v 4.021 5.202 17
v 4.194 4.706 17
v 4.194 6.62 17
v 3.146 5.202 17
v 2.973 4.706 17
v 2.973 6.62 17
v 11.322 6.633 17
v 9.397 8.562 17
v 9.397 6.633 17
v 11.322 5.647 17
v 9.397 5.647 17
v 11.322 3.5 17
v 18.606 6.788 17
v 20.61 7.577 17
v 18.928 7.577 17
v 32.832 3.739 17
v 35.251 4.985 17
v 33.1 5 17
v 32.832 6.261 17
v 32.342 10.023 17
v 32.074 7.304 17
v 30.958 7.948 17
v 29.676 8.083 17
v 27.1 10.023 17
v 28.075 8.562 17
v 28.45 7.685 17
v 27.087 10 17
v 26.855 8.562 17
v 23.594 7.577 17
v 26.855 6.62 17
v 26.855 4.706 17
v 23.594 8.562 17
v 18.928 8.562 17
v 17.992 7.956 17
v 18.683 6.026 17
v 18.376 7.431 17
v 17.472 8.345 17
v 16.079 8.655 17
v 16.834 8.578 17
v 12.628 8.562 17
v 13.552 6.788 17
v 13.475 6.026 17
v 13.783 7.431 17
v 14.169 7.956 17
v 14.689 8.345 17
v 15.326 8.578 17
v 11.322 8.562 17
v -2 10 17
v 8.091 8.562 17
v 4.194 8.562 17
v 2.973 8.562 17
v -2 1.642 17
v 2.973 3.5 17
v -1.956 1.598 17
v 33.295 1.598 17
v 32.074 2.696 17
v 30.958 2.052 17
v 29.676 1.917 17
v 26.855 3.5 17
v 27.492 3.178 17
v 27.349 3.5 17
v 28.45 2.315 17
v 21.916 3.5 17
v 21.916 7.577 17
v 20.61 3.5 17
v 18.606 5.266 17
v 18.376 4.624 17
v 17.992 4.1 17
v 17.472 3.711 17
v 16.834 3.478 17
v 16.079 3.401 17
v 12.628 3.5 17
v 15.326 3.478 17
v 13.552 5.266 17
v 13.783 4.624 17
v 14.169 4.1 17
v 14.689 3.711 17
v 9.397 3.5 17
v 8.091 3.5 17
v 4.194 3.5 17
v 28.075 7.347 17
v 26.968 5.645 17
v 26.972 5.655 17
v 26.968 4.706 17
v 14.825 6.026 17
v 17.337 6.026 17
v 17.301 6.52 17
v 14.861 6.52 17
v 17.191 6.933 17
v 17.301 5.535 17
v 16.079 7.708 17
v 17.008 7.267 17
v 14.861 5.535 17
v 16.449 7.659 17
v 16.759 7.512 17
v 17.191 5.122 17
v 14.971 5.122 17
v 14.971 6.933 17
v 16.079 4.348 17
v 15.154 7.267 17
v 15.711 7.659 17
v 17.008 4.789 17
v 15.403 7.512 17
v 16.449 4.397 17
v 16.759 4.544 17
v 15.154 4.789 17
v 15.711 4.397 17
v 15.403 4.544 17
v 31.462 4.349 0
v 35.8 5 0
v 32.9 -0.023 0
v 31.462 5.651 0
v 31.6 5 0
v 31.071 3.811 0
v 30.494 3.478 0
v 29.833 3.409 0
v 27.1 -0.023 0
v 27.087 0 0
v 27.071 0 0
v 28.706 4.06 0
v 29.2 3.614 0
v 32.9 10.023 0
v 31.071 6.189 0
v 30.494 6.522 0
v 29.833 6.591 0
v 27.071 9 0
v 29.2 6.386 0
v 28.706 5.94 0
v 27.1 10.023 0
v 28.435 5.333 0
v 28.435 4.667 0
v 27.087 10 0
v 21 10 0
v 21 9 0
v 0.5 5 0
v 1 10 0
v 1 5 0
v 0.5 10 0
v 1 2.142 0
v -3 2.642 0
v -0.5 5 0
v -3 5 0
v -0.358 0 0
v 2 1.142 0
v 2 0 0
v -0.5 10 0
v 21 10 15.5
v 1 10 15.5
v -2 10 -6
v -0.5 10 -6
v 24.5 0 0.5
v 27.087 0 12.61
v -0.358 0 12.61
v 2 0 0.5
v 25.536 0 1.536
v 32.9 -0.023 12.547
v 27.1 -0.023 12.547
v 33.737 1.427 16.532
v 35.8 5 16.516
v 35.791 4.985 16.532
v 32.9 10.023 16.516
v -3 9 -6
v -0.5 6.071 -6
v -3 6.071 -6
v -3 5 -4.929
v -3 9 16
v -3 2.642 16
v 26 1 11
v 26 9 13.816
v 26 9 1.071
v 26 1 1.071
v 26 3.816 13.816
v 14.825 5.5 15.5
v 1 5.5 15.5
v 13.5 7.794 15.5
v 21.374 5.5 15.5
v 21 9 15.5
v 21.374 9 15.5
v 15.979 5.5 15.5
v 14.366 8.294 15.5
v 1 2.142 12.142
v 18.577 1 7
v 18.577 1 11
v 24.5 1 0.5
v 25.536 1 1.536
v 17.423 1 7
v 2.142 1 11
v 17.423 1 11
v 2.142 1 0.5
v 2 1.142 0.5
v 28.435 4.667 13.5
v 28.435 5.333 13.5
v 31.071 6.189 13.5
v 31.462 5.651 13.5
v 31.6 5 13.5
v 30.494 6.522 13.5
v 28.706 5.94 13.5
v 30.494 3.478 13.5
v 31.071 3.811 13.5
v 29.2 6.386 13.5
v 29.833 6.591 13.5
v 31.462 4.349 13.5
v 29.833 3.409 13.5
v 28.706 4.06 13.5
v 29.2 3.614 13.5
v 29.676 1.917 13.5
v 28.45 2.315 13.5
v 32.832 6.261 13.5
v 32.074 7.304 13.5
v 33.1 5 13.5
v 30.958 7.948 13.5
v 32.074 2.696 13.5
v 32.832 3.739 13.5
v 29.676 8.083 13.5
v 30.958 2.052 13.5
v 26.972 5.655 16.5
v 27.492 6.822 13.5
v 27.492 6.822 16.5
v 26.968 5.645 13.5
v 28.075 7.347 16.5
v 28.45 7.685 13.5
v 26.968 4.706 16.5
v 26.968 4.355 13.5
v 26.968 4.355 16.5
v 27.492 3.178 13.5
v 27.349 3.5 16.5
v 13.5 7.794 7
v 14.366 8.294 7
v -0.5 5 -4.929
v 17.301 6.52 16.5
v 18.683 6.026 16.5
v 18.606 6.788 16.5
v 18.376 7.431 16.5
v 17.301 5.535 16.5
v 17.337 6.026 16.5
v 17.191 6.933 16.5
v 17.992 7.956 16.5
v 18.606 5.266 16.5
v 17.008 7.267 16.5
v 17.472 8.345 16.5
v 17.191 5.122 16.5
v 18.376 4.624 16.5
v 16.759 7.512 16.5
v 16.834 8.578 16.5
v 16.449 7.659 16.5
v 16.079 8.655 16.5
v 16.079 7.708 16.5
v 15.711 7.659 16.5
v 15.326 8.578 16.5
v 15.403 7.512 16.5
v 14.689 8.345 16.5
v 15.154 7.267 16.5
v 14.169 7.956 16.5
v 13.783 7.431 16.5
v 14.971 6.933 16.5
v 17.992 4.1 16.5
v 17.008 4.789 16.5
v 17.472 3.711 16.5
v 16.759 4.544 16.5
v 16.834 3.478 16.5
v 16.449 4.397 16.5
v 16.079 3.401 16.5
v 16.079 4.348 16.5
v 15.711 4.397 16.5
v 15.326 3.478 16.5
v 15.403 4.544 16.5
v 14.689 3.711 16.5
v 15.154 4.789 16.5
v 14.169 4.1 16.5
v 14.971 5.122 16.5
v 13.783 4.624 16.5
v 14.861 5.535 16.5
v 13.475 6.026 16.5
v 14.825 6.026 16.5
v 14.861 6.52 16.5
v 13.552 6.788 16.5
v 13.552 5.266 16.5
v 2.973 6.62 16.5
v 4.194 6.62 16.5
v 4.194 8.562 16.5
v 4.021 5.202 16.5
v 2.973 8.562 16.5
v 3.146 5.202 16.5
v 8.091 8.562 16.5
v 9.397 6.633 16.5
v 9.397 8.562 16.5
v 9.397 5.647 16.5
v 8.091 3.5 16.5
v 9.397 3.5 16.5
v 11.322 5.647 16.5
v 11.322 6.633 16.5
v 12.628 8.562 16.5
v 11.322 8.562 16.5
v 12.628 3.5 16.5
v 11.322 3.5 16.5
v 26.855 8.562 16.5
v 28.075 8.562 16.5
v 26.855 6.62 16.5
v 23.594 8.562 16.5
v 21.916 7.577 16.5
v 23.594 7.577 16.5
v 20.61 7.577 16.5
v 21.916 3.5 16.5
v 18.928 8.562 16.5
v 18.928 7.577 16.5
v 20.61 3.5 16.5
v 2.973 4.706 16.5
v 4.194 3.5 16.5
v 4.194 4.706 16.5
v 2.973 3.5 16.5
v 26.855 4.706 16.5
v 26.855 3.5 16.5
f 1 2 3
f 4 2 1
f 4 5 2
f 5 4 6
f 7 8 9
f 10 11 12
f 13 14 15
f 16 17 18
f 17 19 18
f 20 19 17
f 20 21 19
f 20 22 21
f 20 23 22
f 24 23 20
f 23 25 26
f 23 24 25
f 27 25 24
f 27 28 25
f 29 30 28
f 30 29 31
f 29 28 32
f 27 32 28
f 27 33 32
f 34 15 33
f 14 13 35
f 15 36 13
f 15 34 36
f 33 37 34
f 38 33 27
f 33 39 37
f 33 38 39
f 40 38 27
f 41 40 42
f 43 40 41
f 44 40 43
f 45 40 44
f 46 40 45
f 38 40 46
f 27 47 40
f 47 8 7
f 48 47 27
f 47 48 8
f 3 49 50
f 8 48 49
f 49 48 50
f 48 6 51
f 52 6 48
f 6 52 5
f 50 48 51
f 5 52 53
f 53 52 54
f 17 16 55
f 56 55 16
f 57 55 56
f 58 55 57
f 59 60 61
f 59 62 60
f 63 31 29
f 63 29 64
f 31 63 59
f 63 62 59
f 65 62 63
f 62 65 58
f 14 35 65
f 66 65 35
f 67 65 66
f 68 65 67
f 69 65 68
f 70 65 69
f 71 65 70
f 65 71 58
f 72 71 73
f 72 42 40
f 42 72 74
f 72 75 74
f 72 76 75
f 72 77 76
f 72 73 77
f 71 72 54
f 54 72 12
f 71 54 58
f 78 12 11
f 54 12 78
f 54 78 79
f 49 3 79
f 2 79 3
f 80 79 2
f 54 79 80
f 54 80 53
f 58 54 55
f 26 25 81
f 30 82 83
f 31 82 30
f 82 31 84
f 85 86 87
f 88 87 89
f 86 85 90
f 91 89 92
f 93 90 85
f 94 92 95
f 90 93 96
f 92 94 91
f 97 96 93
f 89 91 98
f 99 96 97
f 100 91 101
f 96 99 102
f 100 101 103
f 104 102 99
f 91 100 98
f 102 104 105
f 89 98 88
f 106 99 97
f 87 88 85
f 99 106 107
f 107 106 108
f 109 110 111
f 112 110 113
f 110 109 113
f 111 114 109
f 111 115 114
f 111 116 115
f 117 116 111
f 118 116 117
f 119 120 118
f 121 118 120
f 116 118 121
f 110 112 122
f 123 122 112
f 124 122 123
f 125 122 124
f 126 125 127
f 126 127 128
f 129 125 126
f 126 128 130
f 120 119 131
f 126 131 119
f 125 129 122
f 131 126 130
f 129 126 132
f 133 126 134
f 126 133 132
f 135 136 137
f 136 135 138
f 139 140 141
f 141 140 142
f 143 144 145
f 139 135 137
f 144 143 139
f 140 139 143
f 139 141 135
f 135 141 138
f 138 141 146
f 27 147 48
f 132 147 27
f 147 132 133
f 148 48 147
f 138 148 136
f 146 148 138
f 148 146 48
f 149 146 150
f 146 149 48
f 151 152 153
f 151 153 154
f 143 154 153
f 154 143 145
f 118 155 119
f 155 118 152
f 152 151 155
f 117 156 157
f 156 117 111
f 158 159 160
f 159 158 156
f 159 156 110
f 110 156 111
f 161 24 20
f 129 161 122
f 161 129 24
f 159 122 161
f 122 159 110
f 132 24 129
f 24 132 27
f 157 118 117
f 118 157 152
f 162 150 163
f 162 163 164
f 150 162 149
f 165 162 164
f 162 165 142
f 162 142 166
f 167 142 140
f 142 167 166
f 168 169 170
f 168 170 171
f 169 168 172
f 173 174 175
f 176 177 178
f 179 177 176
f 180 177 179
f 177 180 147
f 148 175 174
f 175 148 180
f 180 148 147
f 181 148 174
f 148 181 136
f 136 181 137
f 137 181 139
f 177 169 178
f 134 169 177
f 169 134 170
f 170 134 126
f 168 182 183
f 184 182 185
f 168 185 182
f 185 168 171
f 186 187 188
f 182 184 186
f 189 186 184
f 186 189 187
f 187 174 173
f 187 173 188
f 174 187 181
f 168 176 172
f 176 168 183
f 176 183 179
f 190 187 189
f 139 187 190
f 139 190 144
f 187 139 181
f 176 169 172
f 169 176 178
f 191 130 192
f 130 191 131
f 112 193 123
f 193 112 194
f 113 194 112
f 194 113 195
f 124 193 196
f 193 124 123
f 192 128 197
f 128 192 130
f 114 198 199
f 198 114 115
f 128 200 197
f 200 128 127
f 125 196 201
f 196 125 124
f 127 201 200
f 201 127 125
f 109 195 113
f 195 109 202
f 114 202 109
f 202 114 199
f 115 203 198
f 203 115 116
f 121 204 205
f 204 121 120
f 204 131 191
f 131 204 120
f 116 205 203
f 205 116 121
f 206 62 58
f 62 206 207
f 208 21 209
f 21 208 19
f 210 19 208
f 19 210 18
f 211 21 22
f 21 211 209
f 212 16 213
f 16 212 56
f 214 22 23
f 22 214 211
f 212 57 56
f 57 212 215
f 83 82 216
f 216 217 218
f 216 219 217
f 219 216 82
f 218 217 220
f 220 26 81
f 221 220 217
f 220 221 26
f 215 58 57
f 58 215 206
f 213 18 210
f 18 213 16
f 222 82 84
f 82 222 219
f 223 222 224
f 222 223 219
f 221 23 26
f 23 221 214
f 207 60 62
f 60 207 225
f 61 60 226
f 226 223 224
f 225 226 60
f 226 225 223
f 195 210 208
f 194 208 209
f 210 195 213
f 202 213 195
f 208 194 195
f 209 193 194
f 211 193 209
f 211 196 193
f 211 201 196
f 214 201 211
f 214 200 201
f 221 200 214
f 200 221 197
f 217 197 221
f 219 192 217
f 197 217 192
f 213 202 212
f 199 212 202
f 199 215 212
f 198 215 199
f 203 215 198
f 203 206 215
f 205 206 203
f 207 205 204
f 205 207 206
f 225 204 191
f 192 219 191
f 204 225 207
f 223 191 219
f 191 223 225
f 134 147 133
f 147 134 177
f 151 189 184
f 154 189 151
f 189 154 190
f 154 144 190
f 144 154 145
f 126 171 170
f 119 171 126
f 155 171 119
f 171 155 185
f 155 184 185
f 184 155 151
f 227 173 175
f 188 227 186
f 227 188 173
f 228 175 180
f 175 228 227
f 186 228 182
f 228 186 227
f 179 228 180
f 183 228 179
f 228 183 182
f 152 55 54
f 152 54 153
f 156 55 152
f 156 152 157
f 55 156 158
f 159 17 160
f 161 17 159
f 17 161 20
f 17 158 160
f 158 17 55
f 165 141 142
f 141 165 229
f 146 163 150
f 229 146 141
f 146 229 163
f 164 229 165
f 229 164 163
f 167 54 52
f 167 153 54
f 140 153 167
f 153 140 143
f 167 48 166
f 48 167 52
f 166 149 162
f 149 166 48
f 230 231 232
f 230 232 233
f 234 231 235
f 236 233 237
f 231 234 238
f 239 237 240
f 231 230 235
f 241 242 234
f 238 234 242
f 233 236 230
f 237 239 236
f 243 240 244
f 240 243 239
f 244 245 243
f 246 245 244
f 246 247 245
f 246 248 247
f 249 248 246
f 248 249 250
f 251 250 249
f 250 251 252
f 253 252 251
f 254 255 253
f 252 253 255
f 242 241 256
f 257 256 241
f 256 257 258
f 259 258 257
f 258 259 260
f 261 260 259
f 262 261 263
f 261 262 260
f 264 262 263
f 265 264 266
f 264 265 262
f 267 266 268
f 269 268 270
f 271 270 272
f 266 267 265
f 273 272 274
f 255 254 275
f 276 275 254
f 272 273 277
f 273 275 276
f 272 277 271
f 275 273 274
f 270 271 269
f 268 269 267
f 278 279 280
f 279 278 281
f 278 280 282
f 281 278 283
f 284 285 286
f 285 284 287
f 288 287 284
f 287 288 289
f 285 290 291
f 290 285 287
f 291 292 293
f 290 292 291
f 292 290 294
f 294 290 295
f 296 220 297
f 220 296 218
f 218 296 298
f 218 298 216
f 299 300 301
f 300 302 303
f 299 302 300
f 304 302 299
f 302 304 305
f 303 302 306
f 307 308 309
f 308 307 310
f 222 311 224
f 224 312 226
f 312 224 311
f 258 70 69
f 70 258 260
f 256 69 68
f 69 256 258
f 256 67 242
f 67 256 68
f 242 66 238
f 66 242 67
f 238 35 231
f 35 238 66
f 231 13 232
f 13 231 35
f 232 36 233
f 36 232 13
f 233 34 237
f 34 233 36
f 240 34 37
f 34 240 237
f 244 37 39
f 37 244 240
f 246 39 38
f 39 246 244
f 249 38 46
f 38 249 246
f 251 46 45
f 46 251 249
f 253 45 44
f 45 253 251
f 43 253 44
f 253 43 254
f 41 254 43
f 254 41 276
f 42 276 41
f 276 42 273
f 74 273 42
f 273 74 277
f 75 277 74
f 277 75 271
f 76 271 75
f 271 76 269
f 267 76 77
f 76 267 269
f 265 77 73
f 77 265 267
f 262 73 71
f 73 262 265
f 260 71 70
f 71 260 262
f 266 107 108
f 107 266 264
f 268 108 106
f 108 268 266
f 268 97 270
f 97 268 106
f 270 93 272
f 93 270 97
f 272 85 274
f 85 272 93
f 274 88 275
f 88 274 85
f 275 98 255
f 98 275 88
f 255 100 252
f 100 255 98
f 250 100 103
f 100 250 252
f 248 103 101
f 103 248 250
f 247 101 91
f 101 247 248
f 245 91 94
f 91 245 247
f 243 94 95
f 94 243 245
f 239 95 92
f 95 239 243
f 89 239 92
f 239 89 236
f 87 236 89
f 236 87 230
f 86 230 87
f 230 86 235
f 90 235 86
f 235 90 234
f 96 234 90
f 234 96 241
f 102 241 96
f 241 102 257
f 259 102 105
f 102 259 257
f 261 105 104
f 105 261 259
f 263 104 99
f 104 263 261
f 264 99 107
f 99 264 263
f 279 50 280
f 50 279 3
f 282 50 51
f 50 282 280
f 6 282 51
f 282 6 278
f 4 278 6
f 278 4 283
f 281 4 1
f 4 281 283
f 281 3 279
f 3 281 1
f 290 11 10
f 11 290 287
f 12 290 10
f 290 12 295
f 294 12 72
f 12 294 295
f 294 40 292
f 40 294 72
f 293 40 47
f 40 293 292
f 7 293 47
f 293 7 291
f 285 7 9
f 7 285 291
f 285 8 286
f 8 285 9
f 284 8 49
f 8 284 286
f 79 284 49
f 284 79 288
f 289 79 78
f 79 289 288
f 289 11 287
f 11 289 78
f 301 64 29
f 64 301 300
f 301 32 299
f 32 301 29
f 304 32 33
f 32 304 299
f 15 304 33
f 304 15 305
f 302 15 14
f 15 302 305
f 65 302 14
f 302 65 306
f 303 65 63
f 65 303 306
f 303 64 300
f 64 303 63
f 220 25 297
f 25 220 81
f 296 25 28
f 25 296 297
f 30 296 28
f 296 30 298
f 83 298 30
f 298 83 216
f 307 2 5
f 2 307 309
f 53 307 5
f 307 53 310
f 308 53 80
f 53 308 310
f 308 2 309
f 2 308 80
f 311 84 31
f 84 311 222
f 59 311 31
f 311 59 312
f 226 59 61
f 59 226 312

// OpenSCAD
module fan_nozzle(){

  difference(){
    union(){
      cube([32,10,17]); // Main cube
      translate([30,5,0]) cylinder(r=5.8,h=17,$fn=6);
      translate([-3,0,-6]) cube([3,10,23]);
      //#translate([-2,5,0])cylinder(r=5.8,h=17,$fn=6);
    }
    // Mounting screw.
    translate([30,5,-10]) cylinder(r=3.2/2,h=24.5-0.2,$fn=15); // Screw cut
    translate([30,5,17-3.5]) cylinder(r=3.1,h=20,$fn=15); // head cut

    //#translate([-2,5,-10])cylinder(r=3.2/2,h = 24.5-0.2, $fn=15); // Screw cut
    //#translate([-2,5,17-3.5])cylinder(r=3.1,h = 20, $fn=15); // head cut

    // Fan entry hole.
    translate([1,10-1.5,-1]) cube([20,3,16.5]);
    translate([1,10-1.5,-1-5]) cube([18,3,16.5]);

    // Airway cutout.
    difference(){
      translate([1,1,-1]) cube([25,8,16.5]);
      translate([0,0,10]) rotate([45,0,0]) cube([30,8,16.5]);
      translate([-1,-10,-1]) rotate([0,0,45]) cube([10,8,30]);
      translate([20,0,16]) rotate([0,20,0]) cube([10,20,10]);
    }
    translate([2,-1,-4.5]) cube([24,3,5]);
    //#translate([-2,-1,-2]) rotate([0,45,0]) cube([5,10,5]);
    translate([22,-1,-2]) rotate([0,45,0]) cube([5,10,5]);
  }

  // Air director
  translate([18,0,7]) rotate([0,0,30]) cube([1,9,10]);
}

module fancy_corners(){
  translate([-10,-10.5,13]) rotate([-20,0,0]) cube([50,10,15]);
  translate([-16,-10.5,17.5]) rotate([0,45,0]) cube([10,30,15]);

  translate([46.5,-10.5,15]) rotate([0,-45,30]) cube([10,30,15]);
  translate([28.62,-10.5,15]) rotate([0,-45,-30]) cube([10,30,15]);

  translate([-5,-1,-7]) rotate([0,0,0]) cube([10,6,7]);
  translate([-0.5,-1,-7]) rotate([0,0,0]) cube([1,15,7]);
  translate([-5,4,-11]) rotate([45,0,0]) cube([10,5,5]);

  // Left cut.
  translate([-6.5,-8,-5]) rotate([0,0,45]) cube([10,10,45]);
  translate([-7,-5,12]) rotate([0,-45,0]) cube([10,30,15]);

  translate([-7,5,-10]) rotate([0,0,45]) cube([10,10,35]);

  }

module fan_n(){
  difference(){
    fan_nozzle();
    fancy_corners();
    translate([2,3.5,16.5]) linear_extrude(height=0.6){
      text("! HOT !",size=5,font="Helvetica Neue:style=Bold");
    }
  }
}

fan_n();
